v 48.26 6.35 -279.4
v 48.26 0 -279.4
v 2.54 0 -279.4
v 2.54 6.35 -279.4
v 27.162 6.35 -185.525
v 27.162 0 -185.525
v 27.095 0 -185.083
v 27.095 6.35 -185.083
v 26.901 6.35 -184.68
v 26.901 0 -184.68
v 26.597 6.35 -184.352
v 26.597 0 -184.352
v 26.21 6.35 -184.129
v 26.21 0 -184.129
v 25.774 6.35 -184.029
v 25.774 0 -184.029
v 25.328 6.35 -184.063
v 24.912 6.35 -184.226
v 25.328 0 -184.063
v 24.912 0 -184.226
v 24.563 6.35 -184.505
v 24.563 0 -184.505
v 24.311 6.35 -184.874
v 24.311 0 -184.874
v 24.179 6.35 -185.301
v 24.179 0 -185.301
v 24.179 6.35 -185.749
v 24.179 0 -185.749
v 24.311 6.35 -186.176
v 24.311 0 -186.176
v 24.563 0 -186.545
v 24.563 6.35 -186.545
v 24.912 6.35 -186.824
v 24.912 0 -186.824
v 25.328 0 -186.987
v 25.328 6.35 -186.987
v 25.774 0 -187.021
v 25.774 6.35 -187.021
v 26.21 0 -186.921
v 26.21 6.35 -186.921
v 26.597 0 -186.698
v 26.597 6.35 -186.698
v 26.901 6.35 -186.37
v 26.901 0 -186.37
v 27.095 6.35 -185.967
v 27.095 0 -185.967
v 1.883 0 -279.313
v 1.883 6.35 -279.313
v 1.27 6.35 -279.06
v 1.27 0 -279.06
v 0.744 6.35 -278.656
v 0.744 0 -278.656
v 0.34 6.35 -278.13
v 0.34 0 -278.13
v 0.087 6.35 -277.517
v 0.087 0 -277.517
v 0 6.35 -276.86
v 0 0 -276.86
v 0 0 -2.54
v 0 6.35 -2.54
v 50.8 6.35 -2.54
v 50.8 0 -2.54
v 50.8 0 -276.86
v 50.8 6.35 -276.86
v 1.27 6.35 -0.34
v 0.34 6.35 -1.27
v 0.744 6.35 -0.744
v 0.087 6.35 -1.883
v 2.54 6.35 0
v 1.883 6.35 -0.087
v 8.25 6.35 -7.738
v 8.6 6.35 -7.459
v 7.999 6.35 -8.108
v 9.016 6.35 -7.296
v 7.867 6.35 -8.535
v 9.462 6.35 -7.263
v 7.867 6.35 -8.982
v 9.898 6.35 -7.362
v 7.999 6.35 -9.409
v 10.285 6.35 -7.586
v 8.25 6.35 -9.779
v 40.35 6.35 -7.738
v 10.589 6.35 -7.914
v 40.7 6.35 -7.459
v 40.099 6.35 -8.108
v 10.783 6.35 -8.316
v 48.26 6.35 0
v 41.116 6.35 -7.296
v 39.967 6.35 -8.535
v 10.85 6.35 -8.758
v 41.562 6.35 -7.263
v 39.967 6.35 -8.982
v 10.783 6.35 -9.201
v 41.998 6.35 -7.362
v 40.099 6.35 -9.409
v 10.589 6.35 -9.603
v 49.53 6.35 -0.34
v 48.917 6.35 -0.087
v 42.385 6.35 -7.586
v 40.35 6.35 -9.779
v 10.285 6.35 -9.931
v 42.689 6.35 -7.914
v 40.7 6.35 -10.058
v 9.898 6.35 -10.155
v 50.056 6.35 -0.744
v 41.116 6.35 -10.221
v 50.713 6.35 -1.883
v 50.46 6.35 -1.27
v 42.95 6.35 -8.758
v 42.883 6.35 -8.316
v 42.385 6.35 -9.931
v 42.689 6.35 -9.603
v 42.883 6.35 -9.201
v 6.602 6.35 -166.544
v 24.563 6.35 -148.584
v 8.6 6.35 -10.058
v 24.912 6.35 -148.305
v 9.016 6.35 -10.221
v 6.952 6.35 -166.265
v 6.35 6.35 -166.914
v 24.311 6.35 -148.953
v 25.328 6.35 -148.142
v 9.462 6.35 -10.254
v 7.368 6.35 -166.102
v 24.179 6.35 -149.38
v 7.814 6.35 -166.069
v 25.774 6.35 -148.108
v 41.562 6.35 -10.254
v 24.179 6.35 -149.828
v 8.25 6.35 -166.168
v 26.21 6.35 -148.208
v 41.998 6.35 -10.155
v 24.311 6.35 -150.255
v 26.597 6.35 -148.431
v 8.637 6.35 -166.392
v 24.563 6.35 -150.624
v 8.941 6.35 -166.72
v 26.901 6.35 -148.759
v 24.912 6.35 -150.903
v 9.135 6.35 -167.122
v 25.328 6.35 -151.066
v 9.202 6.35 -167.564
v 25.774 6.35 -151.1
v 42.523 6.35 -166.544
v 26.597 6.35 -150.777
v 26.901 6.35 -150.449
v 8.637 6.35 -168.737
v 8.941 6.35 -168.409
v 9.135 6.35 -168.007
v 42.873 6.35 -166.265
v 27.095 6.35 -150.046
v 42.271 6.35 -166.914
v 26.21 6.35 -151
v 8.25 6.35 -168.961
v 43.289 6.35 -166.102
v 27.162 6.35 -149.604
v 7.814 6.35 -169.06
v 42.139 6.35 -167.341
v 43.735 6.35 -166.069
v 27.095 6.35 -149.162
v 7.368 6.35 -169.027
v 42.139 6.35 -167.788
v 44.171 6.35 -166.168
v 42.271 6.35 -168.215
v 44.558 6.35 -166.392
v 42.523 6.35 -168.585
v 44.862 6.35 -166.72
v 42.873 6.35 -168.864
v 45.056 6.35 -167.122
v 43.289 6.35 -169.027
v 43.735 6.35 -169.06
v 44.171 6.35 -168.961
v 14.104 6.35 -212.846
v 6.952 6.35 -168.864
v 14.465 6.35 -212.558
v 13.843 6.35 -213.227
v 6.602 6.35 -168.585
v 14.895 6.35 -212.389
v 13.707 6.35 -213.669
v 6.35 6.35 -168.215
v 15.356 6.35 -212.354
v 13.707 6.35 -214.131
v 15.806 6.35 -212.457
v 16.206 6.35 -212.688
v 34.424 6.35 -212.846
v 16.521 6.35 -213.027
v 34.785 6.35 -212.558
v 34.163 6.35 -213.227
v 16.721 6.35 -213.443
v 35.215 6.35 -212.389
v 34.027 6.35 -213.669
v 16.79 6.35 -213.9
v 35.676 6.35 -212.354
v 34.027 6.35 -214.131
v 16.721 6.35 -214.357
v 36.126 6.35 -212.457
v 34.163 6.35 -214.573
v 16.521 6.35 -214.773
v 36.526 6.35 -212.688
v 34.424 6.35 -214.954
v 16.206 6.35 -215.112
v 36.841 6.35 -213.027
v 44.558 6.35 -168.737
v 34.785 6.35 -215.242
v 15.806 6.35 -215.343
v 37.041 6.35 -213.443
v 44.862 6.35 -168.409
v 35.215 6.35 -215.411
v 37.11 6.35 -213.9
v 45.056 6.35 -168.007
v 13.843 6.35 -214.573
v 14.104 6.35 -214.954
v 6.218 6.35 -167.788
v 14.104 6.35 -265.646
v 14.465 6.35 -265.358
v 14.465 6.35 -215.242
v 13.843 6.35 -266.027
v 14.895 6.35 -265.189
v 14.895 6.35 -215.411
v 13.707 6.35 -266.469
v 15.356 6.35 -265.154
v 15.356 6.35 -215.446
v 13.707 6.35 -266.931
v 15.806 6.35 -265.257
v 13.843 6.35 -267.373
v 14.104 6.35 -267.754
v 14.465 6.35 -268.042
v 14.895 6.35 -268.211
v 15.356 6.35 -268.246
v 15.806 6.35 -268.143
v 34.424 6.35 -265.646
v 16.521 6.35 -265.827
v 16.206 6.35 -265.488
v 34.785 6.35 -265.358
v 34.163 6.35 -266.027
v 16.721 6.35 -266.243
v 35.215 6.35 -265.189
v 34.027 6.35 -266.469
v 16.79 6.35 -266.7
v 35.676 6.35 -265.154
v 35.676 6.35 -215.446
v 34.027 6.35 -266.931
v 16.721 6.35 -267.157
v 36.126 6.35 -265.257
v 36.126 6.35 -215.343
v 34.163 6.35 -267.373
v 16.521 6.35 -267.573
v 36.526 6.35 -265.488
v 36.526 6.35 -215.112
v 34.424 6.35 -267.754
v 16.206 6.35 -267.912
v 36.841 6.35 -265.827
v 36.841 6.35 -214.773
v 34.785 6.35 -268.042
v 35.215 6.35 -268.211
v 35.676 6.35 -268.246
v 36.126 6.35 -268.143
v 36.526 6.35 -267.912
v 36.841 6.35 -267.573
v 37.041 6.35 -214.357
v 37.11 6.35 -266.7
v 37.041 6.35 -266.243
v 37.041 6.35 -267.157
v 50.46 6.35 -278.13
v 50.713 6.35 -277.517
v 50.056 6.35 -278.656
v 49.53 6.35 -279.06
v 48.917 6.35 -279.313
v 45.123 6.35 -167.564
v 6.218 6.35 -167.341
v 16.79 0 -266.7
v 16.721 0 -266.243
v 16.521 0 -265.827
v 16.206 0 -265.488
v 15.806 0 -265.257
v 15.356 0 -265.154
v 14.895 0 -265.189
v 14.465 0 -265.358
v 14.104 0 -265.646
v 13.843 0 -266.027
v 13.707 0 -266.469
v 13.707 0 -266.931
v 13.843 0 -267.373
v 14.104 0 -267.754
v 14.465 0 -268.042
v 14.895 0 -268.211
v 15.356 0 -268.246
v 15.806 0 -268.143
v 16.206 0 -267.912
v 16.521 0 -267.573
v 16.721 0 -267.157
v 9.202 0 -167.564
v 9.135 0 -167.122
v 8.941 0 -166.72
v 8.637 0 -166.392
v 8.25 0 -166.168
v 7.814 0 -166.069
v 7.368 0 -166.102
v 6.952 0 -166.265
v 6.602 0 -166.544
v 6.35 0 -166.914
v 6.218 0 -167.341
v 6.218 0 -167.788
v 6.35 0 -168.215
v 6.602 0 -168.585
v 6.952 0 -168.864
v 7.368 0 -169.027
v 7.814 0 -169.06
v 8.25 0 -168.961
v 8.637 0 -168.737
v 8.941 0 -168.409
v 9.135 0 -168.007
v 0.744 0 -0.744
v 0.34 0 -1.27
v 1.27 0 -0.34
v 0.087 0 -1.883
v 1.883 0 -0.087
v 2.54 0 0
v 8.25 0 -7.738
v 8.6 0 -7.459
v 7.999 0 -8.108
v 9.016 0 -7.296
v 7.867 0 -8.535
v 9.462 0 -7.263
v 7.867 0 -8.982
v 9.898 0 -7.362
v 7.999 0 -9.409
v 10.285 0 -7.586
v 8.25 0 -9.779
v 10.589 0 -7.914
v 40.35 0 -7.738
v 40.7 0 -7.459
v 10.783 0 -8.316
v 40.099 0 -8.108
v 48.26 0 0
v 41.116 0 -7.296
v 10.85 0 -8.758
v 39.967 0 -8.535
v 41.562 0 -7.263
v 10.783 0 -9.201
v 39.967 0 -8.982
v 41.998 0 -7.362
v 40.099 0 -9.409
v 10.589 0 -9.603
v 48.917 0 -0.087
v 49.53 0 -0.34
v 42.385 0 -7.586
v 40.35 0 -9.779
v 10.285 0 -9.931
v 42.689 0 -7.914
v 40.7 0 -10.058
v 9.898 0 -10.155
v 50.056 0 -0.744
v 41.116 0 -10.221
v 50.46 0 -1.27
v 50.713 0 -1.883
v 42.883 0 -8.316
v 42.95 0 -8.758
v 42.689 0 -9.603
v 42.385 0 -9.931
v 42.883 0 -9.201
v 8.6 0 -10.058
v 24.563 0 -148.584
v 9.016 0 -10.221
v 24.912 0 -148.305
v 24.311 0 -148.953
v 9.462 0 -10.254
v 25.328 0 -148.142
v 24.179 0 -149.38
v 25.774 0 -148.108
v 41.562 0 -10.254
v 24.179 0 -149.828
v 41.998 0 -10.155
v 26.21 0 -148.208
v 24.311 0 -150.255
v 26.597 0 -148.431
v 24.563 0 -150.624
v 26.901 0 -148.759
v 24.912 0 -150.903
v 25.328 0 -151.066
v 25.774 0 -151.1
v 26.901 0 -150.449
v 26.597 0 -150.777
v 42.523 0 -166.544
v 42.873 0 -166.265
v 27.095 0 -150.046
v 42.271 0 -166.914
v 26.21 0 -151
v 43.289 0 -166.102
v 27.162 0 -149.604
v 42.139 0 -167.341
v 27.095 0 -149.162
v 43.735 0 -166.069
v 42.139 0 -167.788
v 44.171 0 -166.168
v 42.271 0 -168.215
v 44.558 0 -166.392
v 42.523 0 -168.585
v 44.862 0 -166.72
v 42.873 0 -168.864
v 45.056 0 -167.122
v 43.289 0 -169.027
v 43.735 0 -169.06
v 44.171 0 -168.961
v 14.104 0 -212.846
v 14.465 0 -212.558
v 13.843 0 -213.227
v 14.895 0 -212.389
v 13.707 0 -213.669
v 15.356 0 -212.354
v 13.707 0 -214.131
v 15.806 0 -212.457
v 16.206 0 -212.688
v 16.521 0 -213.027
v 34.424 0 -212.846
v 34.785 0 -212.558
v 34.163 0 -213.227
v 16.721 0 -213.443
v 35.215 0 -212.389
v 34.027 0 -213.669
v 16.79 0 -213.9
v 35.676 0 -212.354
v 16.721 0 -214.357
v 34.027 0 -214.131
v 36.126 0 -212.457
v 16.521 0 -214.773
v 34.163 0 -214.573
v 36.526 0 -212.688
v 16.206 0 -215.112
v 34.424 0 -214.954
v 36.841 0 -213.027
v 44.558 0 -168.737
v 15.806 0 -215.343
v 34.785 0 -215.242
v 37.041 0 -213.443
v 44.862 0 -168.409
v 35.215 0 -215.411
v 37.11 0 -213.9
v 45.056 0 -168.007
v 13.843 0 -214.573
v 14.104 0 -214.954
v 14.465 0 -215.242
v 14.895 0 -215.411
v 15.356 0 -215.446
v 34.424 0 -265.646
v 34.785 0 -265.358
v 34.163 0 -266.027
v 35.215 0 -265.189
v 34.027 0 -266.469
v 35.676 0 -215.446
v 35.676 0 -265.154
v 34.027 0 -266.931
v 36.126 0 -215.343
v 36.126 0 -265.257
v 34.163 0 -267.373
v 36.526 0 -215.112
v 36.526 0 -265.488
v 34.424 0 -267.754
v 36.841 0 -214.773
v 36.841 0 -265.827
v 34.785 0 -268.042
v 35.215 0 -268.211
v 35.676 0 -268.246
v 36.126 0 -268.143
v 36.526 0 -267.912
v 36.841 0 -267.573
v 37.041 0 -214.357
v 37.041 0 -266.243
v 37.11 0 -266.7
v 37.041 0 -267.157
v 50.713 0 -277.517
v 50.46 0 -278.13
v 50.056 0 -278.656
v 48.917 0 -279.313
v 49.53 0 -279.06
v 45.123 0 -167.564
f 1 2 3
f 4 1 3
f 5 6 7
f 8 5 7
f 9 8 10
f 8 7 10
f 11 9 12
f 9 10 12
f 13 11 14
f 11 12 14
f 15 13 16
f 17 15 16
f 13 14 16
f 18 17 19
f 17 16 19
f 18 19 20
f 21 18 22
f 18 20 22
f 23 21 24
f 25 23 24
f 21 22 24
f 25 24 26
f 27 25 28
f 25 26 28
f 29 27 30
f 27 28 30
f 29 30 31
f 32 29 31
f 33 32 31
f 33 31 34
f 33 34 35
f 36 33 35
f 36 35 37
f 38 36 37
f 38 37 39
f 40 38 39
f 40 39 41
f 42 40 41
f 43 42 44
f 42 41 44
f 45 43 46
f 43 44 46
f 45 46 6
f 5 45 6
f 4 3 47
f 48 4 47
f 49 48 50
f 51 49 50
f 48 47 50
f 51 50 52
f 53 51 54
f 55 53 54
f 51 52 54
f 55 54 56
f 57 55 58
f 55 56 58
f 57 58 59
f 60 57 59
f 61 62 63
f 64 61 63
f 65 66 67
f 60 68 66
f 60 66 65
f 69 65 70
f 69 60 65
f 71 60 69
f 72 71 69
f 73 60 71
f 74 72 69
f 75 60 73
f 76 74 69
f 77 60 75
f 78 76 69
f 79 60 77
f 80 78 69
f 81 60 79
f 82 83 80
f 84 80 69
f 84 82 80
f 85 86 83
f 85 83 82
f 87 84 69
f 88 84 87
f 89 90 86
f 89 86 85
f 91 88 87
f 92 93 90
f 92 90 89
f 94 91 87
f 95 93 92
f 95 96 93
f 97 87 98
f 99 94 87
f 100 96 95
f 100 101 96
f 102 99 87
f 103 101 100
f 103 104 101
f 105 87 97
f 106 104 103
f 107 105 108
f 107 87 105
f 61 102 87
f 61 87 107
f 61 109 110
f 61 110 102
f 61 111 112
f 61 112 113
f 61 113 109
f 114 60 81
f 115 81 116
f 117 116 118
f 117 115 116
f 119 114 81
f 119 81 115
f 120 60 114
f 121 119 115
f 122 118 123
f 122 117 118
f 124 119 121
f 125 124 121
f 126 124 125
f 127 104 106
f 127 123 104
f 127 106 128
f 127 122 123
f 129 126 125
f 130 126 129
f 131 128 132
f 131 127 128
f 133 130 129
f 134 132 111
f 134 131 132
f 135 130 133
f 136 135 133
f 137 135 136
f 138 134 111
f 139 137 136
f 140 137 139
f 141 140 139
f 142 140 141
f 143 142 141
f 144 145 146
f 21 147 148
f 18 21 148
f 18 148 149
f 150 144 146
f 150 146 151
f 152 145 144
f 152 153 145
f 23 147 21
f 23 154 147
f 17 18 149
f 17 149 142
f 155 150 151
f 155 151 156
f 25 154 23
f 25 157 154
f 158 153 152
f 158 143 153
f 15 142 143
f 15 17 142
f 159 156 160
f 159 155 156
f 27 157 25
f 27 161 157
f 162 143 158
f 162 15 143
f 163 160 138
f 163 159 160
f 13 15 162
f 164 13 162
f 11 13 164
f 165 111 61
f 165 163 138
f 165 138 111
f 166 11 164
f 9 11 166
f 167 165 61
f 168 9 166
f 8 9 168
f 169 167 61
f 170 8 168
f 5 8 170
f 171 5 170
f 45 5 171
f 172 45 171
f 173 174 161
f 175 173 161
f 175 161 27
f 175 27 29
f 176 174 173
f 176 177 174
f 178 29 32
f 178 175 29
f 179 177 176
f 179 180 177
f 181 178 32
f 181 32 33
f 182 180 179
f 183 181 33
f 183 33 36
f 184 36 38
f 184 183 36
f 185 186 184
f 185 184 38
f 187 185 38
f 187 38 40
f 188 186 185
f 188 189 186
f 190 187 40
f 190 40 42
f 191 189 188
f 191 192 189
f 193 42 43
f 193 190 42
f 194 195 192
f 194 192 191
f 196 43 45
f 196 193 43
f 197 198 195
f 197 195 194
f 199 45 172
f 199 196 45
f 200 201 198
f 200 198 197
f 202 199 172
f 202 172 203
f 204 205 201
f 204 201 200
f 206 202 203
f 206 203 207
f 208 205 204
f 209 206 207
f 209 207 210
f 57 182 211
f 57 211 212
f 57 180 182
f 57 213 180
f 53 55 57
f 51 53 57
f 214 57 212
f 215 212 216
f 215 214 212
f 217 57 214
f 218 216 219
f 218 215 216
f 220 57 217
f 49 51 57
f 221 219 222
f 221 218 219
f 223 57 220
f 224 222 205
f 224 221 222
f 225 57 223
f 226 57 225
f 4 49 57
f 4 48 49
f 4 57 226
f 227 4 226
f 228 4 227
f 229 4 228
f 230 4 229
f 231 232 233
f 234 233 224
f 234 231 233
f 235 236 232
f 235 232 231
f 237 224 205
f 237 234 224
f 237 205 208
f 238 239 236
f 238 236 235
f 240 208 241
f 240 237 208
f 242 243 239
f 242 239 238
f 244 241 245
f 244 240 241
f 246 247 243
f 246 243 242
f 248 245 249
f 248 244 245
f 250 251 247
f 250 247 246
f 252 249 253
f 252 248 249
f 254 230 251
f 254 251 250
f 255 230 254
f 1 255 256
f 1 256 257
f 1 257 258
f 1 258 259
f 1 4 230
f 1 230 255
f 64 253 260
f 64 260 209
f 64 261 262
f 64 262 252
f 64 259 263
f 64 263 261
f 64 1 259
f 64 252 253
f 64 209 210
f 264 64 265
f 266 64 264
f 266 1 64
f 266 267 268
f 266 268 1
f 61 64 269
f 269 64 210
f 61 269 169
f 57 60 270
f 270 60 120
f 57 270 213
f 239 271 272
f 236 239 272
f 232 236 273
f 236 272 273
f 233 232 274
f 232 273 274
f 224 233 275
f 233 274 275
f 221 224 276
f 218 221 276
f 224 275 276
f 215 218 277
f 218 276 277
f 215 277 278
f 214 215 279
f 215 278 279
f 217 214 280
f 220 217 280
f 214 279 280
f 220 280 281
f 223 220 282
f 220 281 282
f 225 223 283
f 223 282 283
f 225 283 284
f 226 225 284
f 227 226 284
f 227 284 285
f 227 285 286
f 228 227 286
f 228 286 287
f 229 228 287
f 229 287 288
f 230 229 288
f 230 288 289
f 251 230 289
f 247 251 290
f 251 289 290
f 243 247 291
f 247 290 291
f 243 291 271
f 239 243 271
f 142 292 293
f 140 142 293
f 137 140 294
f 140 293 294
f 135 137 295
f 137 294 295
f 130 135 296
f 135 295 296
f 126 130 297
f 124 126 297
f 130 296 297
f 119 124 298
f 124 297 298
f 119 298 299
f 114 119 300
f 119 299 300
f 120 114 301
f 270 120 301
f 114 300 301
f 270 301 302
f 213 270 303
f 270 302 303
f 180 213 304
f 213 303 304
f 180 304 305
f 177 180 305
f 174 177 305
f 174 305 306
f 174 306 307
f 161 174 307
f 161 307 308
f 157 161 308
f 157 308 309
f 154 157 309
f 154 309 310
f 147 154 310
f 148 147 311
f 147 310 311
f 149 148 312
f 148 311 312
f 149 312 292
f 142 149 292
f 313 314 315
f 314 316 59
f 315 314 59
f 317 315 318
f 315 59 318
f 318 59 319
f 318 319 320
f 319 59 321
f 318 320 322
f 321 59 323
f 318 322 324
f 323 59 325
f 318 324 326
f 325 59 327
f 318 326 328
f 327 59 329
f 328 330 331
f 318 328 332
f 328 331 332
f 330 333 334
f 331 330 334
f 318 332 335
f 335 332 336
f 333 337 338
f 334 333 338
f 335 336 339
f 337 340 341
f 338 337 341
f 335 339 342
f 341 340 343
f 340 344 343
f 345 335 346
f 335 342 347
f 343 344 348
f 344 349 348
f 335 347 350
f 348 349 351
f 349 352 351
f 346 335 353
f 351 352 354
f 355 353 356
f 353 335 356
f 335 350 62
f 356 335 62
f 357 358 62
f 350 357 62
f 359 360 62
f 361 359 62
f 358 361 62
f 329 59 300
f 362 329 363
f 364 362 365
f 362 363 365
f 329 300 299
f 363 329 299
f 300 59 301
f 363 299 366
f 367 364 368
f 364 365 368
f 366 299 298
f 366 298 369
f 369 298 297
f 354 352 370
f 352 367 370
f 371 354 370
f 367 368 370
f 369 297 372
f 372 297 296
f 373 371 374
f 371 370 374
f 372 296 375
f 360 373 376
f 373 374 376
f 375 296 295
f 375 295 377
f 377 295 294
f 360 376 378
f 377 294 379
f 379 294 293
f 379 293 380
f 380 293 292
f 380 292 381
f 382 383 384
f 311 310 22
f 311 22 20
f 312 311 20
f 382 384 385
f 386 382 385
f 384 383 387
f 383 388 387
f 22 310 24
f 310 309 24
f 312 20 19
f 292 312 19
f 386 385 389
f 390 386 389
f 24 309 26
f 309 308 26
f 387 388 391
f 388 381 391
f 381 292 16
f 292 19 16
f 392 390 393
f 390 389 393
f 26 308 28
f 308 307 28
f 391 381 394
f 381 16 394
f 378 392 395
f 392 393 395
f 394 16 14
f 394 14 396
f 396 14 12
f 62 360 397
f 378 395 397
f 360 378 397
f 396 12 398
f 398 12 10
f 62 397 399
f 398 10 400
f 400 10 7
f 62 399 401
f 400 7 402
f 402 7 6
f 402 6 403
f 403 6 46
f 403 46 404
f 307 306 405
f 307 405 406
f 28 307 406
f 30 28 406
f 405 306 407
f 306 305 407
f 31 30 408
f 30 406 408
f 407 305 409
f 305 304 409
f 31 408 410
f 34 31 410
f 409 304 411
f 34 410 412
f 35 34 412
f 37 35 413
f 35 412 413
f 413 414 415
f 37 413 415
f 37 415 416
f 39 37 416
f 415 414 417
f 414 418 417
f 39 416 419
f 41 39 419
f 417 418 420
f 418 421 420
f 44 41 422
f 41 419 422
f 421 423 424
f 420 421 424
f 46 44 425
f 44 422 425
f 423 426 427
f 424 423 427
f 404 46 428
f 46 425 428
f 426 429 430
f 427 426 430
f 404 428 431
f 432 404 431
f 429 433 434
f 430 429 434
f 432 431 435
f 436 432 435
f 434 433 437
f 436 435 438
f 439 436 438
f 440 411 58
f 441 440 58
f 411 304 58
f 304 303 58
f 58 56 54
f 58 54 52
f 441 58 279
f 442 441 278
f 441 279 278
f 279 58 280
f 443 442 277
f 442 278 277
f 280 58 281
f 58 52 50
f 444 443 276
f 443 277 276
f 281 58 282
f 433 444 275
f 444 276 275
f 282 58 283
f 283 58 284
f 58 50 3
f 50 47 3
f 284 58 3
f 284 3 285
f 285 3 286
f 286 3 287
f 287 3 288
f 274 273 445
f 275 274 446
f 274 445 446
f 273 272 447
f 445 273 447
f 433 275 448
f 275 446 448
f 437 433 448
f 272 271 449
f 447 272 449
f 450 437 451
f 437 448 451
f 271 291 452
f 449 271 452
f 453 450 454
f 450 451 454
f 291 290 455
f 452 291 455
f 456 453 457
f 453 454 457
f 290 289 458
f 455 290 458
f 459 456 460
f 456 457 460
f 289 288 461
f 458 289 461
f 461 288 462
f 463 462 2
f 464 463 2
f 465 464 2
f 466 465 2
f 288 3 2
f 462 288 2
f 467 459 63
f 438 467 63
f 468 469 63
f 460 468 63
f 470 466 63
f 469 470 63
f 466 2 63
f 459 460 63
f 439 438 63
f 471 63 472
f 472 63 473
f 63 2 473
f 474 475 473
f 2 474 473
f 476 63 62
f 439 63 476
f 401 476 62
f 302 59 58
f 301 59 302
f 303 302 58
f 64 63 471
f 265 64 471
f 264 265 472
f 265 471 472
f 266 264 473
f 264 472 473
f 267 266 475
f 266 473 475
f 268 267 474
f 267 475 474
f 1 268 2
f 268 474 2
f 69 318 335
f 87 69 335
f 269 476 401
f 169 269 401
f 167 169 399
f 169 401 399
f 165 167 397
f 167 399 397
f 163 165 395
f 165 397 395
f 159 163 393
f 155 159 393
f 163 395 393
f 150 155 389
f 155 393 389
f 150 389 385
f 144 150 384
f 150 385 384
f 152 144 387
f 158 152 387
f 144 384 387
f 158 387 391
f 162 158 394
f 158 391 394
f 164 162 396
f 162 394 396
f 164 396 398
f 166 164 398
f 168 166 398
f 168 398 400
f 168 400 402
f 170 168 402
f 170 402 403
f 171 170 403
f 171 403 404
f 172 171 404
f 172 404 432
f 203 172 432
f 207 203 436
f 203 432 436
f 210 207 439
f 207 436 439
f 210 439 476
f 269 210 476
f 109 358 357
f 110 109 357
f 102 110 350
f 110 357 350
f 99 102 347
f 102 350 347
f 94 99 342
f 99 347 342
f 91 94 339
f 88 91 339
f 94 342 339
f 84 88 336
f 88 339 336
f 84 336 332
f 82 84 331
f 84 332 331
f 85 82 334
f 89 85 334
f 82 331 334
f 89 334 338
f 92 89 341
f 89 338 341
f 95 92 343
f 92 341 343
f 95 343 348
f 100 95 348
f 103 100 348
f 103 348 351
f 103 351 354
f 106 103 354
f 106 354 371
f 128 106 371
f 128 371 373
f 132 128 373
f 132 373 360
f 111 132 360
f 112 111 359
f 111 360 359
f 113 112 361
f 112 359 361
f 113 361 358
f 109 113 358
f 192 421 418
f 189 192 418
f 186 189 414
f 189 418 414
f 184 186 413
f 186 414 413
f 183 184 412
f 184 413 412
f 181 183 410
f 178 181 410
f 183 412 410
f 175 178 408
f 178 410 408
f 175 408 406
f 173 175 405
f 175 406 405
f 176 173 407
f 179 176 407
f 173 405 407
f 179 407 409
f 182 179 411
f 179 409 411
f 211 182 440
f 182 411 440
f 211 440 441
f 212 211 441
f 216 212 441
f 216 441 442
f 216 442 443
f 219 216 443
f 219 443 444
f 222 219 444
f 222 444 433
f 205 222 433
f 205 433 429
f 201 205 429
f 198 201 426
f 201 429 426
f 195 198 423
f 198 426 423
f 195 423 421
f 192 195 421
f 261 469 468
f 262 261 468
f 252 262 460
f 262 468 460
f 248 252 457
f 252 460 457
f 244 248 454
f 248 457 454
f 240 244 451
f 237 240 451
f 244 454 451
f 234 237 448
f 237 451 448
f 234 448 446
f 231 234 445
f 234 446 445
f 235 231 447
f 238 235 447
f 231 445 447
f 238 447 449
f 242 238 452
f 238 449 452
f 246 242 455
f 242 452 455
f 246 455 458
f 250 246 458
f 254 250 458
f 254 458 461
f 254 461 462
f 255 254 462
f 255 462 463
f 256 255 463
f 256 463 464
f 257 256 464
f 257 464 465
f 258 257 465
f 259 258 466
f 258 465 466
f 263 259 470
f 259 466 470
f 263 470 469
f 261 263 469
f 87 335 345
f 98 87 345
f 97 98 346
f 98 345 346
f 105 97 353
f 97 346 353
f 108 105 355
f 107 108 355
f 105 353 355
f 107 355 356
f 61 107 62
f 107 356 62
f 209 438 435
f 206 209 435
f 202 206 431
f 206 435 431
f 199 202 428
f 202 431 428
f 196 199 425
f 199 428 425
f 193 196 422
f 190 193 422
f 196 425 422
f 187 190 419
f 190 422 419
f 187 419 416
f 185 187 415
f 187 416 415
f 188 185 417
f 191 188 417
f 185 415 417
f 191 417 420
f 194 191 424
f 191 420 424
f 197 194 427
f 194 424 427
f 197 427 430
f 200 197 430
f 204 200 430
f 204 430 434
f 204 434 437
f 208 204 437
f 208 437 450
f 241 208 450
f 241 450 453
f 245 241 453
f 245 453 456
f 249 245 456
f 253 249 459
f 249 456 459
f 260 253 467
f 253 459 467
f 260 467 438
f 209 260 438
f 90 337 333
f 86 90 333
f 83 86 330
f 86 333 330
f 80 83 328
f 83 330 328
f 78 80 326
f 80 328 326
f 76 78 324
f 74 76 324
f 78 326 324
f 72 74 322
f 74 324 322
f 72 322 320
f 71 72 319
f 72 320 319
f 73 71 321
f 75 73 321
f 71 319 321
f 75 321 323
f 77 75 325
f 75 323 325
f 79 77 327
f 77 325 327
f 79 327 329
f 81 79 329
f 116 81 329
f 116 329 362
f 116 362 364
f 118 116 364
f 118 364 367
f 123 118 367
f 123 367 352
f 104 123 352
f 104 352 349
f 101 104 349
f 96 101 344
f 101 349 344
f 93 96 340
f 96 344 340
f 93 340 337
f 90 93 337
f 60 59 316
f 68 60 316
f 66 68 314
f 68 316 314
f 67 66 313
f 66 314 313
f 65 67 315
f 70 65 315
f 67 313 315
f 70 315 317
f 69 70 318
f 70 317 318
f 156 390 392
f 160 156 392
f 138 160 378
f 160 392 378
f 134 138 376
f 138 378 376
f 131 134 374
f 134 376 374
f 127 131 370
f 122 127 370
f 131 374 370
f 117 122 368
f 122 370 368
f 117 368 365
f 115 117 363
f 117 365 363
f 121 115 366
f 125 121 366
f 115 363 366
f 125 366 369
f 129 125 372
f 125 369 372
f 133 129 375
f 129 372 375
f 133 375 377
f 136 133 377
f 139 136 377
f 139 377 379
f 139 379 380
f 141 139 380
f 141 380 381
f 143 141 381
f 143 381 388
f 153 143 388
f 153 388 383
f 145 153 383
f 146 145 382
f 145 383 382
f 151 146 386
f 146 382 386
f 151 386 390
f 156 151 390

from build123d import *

# Parameters (mm, degrees)
BOSS_EXTRUDE1_DEPTH = 6.35
SKETCH2_R           = 1.5
CUT_EXTRUDE1_DEPTH  = 6.35
SKETCH3_R           = 1.55
CUT_EXTRUDE2_DEPTH  = 6.35


with BuildPart() as part:
    # Sketch1 → Boss-Extrude1 (new body)
    with BuildSketch(Plane(origin=(0, 0, 0), x_dir=(1, 0, 0), z_dir=(0, 1, 0))):
        with BuildLine():
            Line((2.54, 0), (48.26, 0))
            ThreePointArc((48.26, 0), (50.056051224, 0.743948776), (50.8, 2.54))
            Line((50.8, 2.54), (50.8, 276.86))
            ThreePointArc((50.8, 276.86), (50.056051224, 278.656051224), (48.26, 279.4))
            Line((48.26, 279.4), (2.54, 279.4))
            ThreePointArc((2.54, 279.4), (0.743948776, 278.656051224), (0, 276.86))
            Line((0, 276.86), (0, 2.54))
            ThreePointArc((0, 2.54), (0.743948776, 0.743948776), (2.54, 0))
        make_face()
    extrude(amount=BOSS_EXTRUDE1_DEPTH)

    # Sketch2 → Cut-Extrude1 (cut)
    with BuildSketch(Plane.XZ):
        with Locations((25.662087977, -185.525)):
            Circle(SKETCH2_R)
        with Locations((43.622600219, -167.564487758)):
            Circle(SKETCH2_R)
        with Locations((7.701575735, -167.564487758)):
            Circle(SKETCH2_R)
        with Locations((25.662087977, -149.603975516)):
            Circle(SKETCH2_R)
        with Locations((41.45, -8.758487194)):
            Circle(SKETCH2_R)
        with Locations((9.35, -8.758487194)):
            Circle(SKETCH2_R)
    extrude(amount=-CUT_EXTRUDE1_DEPTH, mode=Mode.SUBTRACT)

    # Sketch3 → Cut-Extrude2 (cut)
    with BuildSketch(Plane.XZ):
        with Locations((15.24, -266.7)):
            Circle(SKETCH3_R)
        with Locations((35.56, -266.7)):
            Circle(SKETCH3_R)
        with Locations((15.24, -213.9)):
            Circle(SKETCH3_R)
        with Locations((35.56, -213.9)):
            Circle(SKETCH3_R)
    extrude(amount=-CUT_EXTRUDE2_DEPTH, mode=Mode.SUBTRACT)


solid = part.part
